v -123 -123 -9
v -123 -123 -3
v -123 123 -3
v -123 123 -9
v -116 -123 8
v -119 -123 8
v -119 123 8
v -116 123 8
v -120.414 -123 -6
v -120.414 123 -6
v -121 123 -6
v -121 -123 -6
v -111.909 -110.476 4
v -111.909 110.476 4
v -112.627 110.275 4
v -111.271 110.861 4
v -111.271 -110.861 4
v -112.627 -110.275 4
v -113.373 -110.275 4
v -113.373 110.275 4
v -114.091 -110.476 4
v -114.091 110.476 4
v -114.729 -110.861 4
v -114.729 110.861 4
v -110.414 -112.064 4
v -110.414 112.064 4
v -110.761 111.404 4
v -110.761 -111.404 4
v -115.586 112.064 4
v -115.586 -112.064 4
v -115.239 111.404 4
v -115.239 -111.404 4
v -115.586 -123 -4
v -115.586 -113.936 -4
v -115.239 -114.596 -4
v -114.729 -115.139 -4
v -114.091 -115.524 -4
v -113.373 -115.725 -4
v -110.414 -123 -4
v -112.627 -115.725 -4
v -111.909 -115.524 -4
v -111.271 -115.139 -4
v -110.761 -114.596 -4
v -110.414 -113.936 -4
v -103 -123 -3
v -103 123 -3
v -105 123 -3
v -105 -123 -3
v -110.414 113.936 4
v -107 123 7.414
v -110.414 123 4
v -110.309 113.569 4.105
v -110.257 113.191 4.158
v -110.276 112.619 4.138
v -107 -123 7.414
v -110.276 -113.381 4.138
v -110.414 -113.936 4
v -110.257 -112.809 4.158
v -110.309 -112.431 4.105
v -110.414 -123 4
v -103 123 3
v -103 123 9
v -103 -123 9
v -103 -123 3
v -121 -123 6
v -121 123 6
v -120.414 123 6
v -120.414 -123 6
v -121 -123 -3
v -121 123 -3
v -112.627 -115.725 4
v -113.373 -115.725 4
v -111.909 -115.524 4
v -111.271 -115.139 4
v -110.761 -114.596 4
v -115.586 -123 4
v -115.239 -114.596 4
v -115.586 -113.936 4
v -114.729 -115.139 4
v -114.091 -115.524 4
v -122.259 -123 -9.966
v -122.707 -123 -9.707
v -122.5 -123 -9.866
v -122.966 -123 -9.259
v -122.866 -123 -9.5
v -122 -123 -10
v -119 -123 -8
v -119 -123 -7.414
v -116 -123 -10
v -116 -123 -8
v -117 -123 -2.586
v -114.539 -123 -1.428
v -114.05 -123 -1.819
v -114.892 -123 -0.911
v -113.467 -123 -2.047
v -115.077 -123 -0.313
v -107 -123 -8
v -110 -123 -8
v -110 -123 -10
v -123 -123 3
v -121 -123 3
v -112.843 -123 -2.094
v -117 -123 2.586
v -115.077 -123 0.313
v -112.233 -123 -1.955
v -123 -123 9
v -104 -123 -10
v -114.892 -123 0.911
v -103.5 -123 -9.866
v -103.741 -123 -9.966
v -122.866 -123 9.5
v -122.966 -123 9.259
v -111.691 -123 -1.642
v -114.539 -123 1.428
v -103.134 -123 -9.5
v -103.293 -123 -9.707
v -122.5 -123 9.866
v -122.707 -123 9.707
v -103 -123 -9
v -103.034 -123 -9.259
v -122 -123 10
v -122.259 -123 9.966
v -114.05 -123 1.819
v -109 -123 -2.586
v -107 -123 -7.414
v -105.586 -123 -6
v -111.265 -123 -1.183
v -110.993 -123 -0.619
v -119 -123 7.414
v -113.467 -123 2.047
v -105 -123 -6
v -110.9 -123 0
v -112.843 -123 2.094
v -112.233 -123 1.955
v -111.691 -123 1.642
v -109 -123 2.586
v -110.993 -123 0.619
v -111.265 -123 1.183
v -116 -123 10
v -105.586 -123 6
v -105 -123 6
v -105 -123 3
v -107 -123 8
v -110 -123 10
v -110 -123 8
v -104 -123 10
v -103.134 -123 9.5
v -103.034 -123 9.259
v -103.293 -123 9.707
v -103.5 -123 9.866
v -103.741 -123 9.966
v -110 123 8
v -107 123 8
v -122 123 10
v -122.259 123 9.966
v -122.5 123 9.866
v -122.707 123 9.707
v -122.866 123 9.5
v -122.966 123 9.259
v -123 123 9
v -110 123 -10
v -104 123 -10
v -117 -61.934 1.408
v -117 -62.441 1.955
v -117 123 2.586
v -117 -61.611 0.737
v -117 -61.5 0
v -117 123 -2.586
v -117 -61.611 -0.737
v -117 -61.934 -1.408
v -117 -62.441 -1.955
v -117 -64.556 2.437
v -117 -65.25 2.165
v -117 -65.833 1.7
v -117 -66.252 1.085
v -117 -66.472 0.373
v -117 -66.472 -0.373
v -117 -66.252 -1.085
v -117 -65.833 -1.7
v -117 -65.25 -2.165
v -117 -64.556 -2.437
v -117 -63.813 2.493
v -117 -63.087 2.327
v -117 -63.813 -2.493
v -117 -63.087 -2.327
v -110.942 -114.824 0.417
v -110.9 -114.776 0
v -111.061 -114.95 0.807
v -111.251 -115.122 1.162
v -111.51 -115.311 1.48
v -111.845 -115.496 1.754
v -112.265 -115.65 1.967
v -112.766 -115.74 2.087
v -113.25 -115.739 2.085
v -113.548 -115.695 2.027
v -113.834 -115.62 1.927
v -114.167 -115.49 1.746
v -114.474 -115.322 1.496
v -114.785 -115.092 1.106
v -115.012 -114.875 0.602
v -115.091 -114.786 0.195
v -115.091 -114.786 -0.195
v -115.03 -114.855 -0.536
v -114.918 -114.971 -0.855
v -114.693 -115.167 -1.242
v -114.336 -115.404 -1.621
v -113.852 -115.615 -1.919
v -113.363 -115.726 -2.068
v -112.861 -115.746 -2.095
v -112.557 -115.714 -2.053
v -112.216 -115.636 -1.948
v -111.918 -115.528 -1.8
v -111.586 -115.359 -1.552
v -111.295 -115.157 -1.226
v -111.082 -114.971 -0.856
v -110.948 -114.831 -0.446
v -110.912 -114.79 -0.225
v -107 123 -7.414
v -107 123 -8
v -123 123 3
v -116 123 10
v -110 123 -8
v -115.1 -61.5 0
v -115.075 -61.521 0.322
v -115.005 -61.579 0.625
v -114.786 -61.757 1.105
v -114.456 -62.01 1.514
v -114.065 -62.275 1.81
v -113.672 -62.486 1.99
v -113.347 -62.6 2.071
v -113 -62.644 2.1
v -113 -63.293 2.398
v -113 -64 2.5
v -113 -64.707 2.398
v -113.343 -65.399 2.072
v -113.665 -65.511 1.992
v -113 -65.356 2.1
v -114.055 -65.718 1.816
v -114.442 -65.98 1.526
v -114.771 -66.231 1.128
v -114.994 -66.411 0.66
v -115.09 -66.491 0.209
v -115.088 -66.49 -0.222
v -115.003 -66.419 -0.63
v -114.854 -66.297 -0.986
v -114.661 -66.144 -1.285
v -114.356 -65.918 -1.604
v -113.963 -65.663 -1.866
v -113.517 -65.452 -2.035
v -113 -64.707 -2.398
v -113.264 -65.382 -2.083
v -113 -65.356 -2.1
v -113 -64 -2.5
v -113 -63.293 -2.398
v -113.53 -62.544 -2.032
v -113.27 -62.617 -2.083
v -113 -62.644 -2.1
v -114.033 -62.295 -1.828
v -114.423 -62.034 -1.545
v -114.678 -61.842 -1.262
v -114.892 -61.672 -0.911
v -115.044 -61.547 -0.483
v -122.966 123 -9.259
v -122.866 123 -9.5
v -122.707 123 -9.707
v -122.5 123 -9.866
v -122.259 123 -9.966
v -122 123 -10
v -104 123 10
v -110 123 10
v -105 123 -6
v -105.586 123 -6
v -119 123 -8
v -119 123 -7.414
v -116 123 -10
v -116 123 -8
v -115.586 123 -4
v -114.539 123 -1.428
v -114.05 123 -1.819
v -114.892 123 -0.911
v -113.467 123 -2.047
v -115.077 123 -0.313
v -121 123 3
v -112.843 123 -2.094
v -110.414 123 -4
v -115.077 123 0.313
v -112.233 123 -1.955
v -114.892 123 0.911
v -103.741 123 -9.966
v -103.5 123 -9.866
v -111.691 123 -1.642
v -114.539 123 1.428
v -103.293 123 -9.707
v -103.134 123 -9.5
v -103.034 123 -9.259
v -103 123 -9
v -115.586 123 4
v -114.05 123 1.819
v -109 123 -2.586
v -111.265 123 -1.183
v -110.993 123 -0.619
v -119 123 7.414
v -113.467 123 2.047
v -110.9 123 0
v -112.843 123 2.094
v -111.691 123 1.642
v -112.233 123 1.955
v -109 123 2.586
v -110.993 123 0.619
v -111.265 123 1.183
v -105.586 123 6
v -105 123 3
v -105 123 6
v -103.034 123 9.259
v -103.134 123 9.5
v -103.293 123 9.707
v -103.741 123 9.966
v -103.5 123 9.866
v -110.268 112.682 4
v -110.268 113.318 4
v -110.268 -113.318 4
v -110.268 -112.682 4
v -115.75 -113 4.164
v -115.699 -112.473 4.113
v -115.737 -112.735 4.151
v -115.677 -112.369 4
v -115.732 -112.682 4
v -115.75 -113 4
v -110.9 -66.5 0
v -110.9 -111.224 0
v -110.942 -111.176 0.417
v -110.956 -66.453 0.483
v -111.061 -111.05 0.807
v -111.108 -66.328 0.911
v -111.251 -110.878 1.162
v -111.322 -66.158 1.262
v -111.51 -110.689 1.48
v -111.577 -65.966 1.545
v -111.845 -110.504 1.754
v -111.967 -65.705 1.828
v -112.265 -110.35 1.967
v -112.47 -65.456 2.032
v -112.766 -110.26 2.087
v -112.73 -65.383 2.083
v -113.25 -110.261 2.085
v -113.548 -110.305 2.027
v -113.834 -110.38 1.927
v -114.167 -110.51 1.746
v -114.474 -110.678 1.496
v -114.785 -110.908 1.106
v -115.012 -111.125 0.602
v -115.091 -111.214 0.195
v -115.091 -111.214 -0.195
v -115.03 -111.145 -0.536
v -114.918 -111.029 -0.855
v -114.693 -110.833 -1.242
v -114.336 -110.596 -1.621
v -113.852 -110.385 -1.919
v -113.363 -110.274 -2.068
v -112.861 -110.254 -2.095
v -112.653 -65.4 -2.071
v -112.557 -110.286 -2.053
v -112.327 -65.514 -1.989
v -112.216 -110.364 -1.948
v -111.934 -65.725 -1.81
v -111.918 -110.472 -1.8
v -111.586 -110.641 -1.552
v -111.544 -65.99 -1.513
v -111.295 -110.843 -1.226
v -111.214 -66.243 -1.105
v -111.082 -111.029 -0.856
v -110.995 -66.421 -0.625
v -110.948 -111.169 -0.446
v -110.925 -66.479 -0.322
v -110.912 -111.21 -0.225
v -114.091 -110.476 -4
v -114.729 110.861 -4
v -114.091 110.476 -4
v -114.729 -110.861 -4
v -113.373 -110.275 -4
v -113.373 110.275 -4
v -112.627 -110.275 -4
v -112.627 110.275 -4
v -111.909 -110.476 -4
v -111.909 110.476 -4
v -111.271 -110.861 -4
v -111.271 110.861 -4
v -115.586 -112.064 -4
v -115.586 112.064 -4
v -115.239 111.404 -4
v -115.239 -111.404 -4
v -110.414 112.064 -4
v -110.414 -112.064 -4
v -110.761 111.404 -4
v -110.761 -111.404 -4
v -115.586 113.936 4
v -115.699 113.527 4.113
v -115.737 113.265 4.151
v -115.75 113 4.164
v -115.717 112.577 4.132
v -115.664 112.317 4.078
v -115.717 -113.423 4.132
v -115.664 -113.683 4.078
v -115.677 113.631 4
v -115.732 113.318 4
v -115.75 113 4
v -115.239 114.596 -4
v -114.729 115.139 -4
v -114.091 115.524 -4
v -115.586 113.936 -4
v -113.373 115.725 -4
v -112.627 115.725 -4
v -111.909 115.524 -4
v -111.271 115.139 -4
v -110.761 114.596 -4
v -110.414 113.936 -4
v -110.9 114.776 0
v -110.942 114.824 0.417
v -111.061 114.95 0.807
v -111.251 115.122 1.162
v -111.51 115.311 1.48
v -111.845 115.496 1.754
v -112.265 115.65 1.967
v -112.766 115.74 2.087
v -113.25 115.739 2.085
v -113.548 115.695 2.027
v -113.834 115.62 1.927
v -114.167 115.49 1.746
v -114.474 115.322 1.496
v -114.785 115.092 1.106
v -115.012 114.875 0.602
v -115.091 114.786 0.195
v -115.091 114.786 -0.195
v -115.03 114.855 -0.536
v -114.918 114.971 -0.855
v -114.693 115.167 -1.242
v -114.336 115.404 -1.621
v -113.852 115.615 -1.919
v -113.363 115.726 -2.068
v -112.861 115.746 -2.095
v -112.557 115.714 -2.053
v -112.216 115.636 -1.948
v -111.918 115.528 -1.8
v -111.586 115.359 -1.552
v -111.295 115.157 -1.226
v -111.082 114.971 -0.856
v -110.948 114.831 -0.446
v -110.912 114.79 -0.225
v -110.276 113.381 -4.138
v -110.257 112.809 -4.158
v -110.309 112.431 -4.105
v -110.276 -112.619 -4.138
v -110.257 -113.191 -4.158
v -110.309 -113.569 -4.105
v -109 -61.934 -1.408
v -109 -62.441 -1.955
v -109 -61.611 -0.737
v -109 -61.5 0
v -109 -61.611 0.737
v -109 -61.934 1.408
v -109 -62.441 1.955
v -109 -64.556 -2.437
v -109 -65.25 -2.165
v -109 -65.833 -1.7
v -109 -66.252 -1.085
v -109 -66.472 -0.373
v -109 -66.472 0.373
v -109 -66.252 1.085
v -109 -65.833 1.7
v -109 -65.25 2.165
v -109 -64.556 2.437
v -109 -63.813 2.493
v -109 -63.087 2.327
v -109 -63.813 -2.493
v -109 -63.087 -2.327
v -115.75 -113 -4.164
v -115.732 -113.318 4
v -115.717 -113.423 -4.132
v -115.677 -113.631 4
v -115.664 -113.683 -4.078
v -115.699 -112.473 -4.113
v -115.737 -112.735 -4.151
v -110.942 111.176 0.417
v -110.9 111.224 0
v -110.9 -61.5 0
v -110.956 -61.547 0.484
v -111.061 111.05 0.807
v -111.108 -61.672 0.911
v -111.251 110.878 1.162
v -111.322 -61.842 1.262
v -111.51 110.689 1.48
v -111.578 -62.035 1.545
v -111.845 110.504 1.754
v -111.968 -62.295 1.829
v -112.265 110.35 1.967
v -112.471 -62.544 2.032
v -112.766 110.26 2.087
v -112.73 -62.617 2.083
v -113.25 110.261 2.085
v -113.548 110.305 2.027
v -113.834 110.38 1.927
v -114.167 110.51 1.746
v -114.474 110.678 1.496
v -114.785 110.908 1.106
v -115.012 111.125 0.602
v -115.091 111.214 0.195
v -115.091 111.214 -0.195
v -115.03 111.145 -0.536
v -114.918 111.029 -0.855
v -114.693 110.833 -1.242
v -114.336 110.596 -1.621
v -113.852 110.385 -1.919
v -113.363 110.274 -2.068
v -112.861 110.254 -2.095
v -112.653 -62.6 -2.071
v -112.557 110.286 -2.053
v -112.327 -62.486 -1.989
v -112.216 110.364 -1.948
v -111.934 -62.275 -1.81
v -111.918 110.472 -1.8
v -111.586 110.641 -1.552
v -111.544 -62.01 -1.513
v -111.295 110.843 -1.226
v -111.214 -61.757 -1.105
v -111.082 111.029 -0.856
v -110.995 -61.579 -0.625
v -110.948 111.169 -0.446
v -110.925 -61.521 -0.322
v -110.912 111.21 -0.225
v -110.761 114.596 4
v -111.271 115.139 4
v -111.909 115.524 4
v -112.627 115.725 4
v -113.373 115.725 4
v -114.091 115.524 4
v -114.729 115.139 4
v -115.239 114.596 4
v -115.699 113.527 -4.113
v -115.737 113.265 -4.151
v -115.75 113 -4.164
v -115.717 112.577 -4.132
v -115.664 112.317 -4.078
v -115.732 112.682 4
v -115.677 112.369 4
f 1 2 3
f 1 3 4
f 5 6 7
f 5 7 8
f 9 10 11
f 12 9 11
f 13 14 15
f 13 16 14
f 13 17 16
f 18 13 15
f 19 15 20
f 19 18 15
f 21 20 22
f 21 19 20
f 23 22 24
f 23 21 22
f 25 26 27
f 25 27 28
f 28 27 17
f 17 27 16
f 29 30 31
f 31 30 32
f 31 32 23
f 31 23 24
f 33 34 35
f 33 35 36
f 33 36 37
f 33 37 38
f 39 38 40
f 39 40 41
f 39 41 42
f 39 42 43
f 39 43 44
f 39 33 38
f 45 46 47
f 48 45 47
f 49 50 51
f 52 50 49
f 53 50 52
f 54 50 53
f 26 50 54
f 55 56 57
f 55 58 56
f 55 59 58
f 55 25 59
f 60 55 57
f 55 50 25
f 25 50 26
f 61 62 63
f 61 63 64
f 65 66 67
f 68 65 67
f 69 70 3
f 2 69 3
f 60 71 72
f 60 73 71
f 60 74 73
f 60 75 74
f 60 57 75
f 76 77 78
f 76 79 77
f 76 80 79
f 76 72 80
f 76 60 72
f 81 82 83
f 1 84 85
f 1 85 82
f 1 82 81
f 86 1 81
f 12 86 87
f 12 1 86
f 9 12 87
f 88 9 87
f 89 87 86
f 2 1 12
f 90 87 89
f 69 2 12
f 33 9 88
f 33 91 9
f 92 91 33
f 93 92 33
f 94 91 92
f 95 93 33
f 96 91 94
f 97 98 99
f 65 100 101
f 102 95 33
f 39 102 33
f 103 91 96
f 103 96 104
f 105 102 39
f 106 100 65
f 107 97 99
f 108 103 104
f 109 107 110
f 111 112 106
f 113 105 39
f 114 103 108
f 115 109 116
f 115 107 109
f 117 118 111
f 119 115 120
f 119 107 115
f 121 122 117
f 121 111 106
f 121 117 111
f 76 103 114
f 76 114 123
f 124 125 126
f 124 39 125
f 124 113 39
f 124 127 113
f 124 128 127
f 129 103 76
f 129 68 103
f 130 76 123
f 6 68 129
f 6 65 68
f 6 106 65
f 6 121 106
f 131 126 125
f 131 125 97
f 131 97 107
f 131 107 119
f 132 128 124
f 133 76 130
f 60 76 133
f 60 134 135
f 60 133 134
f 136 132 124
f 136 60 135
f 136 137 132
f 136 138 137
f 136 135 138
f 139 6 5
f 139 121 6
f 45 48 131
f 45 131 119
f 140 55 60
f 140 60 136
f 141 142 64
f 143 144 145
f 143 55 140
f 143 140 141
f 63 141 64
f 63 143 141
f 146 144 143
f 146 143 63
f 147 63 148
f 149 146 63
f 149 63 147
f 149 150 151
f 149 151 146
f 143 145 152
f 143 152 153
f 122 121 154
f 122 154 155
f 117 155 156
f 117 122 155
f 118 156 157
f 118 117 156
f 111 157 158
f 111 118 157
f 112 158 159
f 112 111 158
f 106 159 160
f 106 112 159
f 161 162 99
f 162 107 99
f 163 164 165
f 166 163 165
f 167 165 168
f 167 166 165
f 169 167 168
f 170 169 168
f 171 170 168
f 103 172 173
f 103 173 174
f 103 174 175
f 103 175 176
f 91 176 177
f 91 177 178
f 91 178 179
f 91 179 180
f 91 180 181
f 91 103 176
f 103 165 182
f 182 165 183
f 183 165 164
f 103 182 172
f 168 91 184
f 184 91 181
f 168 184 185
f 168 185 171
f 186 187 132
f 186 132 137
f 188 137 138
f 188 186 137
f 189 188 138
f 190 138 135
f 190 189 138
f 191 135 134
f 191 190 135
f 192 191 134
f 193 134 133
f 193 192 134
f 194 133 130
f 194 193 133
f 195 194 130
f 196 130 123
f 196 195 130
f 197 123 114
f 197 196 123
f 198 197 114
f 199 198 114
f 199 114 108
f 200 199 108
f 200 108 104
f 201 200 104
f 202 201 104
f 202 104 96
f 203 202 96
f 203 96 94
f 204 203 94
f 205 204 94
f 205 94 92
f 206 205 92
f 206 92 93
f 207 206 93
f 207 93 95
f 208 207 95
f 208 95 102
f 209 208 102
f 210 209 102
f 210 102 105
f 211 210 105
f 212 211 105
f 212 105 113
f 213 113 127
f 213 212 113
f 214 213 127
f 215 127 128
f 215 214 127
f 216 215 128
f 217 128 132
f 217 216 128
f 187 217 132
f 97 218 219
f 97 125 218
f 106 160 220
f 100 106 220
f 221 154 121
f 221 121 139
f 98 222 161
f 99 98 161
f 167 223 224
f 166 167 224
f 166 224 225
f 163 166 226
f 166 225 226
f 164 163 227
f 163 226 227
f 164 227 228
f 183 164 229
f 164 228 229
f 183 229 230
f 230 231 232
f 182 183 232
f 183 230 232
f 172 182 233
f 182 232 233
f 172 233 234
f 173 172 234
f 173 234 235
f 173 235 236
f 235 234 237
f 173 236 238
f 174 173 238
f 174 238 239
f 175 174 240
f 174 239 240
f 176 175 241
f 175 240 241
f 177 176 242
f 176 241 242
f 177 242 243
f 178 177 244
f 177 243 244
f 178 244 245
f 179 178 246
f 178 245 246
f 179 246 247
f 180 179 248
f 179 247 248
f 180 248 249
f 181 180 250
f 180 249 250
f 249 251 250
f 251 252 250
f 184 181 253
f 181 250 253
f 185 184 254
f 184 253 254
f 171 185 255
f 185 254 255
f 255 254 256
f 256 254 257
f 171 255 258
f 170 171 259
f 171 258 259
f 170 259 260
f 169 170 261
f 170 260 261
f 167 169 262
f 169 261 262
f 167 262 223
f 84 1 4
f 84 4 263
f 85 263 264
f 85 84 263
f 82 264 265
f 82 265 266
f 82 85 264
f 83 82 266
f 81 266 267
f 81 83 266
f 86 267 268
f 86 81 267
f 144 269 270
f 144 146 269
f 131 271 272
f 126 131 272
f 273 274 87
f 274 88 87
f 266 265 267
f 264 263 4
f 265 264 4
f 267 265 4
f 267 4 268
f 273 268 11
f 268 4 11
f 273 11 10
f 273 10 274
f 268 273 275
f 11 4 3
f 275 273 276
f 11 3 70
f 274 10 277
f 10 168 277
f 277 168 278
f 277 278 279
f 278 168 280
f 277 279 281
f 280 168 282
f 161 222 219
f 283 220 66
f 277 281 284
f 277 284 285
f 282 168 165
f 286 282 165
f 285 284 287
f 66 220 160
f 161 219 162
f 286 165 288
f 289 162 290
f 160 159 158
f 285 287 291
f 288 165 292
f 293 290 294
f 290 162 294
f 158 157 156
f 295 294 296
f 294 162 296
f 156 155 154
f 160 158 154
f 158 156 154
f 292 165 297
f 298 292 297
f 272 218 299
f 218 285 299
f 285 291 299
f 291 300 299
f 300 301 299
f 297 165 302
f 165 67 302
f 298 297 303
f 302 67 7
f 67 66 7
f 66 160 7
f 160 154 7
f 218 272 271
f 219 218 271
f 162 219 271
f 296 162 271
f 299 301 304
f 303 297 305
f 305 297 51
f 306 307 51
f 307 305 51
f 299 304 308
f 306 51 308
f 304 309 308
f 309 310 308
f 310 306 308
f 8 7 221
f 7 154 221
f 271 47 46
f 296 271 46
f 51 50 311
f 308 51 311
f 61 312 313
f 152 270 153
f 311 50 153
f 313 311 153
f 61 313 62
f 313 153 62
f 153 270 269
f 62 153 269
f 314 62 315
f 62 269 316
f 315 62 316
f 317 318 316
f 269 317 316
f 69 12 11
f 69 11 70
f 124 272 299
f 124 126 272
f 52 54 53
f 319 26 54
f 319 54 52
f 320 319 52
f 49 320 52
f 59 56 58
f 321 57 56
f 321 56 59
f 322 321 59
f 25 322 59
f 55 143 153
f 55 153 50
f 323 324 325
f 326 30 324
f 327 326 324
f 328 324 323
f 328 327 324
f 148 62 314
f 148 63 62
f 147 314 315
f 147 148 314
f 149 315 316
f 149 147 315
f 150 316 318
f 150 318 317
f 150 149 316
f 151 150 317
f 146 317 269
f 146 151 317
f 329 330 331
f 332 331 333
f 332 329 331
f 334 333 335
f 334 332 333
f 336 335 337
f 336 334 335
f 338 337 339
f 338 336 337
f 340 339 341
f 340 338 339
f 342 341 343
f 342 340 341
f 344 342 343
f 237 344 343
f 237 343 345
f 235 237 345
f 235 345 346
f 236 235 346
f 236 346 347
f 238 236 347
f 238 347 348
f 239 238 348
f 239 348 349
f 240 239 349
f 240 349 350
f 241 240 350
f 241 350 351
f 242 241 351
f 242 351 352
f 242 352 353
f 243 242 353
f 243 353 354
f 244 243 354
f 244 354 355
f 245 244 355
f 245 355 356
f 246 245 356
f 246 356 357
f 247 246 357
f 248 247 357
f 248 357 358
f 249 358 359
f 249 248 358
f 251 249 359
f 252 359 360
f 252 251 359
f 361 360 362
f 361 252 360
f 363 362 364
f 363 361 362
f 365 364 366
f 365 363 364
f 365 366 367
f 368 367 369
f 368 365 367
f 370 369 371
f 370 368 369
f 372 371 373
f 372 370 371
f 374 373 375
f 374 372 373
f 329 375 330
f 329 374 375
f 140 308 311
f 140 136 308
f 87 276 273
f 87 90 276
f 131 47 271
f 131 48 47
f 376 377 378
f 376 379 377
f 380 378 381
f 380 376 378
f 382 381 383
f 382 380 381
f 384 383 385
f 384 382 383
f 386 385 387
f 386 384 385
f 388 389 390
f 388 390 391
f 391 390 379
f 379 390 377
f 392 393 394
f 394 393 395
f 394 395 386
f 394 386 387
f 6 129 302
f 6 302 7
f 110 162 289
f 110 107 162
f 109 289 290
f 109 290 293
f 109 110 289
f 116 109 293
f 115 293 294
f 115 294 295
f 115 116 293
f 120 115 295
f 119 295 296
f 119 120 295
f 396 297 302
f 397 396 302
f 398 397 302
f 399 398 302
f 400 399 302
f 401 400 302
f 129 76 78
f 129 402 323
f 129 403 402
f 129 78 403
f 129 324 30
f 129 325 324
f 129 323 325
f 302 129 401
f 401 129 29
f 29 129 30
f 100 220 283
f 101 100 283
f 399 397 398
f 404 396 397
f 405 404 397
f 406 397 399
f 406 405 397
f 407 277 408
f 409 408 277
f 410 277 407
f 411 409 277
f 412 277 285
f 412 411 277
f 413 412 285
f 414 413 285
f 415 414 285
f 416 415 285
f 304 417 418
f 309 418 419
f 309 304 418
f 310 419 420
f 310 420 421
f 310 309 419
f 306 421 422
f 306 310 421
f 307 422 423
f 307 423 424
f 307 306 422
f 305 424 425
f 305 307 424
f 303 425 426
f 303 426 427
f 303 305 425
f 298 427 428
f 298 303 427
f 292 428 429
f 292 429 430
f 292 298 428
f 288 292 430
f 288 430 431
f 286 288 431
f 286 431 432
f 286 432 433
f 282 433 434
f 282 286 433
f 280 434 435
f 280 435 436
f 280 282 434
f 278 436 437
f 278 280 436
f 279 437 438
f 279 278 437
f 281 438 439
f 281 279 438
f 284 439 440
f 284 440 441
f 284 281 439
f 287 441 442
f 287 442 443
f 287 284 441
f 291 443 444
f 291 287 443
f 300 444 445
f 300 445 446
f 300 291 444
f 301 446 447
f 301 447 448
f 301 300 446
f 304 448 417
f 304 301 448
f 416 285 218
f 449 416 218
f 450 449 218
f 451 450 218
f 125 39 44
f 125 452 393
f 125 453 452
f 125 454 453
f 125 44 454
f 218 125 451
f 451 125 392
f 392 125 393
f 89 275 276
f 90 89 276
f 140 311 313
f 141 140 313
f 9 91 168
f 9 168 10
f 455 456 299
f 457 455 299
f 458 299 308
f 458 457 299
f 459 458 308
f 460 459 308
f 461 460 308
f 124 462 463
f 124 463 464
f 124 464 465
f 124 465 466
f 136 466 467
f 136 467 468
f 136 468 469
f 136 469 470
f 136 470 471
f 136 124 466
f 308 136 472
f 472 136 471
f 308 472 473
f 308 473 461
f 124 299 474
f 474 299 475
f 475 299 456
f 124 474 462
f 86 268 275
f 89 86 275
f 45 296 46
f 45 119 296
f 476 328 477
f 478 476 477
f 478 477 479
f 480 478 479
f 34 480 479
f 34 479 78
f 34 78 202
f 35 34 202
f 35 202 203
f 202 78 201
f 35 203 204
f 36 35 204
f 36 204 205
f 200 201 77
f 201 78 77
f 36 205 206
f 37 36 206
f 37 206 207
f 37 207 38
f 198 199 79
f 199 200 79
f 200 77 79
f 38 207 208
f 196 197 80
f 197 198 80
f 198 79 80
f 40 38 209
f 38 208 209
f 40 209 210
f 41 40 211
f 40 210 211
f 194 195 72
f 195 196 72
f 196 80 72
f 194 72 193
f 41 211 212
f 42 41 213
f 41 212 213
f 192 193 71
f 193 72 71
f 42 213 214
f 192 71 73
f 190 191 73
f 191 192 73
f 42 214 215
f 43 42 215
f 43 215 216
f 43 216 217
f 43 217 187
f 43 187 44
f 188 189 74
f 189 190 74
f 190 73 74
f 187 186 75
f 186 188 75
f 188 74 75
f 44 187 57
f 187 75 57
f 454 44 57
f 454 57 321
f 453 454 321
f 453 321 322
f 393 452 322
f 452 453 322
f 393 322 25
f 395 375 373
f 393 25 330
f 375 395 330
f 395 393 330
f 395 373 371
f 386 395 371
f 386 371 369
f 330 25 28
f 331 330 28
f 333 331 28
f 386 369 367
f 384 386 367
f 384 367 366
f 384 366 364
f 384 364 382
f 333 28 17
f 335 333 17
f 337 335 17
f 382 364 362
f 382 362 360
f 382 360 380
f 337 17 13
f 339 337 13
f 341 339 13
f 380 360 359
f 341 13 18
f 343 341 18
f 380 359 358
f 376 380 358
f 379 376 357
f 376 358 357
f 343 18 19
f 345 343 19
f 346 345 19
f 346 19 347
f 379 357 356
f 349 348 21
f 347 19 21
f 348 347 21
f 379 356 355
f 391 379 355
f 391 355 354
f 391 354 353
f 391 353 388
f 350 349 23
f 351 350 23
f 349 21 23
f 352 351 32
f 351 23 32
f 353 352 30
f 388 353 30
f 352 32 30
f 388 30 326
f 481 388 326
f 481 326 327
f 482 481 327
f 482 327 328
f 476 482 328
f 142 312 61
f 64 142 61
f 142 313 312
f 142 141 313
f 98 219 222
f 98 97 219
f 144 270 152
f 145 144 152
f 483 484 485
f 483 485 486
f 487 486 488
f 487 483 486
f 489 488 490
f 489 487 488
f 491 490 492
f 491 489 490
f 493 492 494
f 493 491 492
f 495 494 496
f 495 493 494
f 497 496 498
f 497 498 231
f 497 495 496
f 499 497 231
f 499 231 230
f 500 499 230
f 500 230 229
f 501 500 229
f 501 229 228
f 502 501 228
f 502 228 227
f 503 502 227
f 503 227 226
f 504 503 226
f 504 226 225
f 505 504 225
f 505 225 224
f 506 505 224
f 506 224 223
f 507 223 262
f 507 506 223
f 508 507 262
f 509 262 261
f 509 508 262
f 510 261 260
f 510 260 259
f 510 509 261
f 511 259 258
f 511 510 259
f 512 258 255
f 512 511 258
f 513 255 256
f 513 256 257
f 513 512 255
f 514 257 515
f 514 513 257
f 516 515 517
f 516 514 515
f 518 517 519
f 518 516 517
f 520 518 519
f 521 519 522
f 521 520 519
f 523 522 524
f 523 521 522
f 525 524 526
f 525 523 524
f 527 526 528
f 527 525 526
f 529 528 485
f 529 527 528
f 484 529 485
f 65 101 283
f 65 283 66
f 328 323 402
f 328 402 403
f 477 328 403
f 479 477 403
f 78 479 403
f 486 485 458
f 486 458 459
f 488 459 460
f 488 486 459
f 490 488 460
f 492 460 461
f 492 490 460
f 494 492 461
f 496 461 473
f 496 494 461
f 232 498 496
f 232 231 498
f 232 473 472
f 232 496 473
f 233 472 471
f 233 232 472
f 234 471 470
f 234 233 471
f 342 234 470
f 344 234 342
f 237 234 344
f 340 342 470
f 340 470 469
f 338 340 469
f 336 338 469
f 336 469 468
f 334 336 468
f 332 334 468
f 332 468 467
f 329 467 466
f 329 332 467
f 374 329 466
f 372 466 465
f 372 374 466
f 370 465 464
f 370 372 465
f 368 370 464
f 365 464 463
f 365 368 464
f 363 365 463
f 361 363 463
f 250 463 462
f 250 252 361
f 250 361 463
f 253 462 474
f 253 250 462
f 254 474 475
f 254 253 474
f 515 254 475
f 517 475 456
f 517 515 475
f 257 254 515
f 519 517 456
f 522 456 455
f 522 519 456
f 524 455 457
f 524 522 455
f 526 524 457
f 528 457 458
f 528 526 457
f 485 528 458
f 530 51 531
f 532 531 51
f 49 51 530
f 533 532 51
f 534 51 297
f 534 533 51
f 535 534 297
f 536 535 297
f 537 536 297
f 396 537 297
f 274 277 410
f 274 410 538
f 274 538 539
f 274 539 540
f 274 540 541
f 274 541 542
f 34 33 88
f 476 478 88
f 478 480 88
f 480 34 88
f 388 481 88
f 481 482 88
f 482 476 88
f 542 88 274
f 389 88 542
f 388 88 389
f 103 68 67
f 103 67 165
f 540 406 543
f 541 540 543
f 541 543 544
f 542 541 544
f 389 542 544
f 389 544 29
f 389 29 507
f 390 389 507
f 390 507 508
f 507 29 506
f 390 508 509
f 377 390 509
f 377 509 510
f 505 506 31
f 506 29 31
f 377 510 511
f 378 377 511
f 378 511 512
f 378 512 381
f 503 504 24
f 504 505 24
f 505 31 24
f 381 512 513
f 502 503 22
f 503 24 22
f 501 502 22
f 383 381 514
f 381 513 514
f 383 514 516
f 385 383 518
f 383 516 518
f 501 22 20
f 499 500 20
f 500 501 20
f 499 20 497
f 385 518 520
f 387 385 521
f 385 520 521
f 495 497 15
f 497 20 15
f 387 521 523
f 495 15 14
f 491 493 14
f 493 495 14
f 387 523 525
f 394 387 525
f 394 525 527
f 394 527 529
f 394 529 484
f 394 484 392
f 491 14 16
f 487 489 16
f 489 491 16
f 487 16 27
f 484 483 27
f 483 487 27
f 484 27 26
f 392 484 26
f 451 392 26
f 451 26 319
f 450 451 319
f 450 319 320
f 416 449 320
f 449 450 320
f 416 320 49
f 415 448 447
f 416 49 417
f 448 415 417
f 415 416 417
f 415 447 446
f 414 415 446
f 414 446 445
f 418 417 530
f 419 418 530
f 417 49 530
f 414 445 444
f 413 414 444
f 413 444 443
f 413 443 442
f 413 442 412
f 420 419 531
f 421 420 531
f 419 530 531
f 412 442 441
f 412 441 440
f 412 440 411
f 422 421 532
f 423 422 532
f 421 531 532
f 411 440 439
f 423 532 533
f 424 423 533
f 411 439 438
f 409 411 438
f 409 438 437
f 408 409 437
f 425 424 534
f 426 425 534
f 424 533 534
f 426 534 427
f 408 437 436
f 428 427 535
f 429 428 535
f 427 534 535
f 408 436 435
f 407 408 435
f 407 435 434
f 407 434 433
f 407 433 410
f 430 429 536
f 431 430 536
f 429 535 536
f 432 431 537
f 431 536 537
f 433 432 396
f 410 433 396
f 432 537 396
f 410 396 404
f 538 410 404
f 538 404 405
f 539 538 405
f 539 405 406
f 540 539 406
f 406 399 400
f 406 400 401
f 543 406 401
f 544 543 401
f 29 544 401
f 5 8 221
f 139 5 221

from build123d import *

# Parameters (mm, degrees)
SKETCH044_R          = 2.1
PAD023_DEPTH         = 123
SKETCH054_R          = 2.5
POCKET010_DEPTH      = 10.001
POCKET010_DEPTH_BACK = 10.001
SKETCH094_R          = 2.75
POCKET037_DEPTH      = 14.001
POCKET037_DEPTH_BACK = 6.001


with BuildPart() as part:
    # Sketch044 → Pad023 (new body, symmetric)
    with BuildSketch(Plane.XZ):
        with BuildLine():
            Line((3, 10), (3, 8))
            Line((3, 8), (6, 8))
            Line((6, 8), (6, 7.414214))
            Line((6, 7.414214), (2.585786, 4))
            Line((2.585786, 4), (-2.585786, 4))
            Line((-2.585786, 4), (-6, 7.414214))
            Line((-6, 7.414214), (-6, 8))
            Line((-6, 8), (-3, 8))
            Line((-3, 8), (-3, 10))
            Line((-8.999982, 10), (-3, 10))
            ThreePointArc((-8.999982, 10), (-9.707108, 9.707105), (-10, 8.999978))
            Line((-10, 8.999978), (-10, 3))
            Line((-10, 3), (-8, 3))
            Line((-8, 3), (-8, 6))
            Line((-8, 6), (-7.414214, 6))
            Line((-7.414214, 6), (-4, 2.585786))
            Line((-4, 2.585786), (-4, -2.585786))
            Line((-4, -2.585786), (-7.414214, -6))
            Line((-7.414214, -6), (-8, -6))
            Line((-8, -6), (-8, -3))
            Line((-8, -3), (-10, -3))
            Line((-10, -3), (-10, -9))
            ThreePointArc((-10, -9), (-9.707101, -9.707113), (-8.999982, -10))
            Line((-8.999982, -10), (-3, -10))
            Line((-3, -10), (-3, -8))
            Line((-3, -8), (-6, -8))
            Line((-6, -7.414214), (-6, -8))
            Line((-2.585786, -4), (-6, -7.414214))
            Line((-2.585786, -4), (2.585786, -4))
            Line((2.585786, -4), (6, -7.414214))
            Line((6, -7.414214), (6, -8))
            Line((6, -8), (3, -8))
            Line((3, -8), (3, -10))
            Line((8.999986, -10), (3, -10))
            ThreePointArc((8.999986, -10), (9.707102, -9.707112), (10, -9))
            Line((10, -9), (10, -3))
            Line((10, -3), (8, -3))
            Line((8, -3), (8, -6))
            Line((8, -6), (7.414214, -6))
            Line((7.414214, -6), (4, -2.585786))
            Line((4, -2.585786), (4, 2.585786))
            Line((4, 2.585786), (7.414214, 6))
            Line((7.414214, 6), (8, 6))
            Line((8, 6), (8, 3))
            Line((8, 3), (10, 3))
            Line((10, 8.999978), (10, 3))
            ThreePointArc((10, 8.999978), (9.70711, 9.707104), (8.999986, 10))
            Line((8.999986, 10), (3, 10))
        make_face()
        Circle(SKETCH044_R, mode=Mode.SUBTRACT)
    extrude(amount=PAD023_DEPTH, both=True)

    # Sketch054 → Pocket010 (cut, two sides)
    with BuildSketch(Plane.YZ) as pocket010_sk:
        with Locations((-64, 0)):
            Circle(SKETCH054_R)
    extrude(amount=-POCKET010_DEPTH, mode=Mode.SUBTRACT)
    extrude(pocket010_sk.sketch, amount=POCKET010_DEPTH_BACK, mode=Mode.SUBTRACT)

    # Sketch094 (on Face7 of Pad023) → Pocket037 (cut, two sides)
    with BuildSketch(Plane(origin=(0, 0, 4), x_dir=(-1, 0, 0), z_dir=(0, 0, 1))) as pocket037_sk:
        with Locations((0, 113)):
            Circle(SKETCH094_R)
        with Locations((0, -113)):
            Circle(SKETCH094_R)
    extrude(amount=-POCKET037_DEPTH, mode=Mode.SUBTRACT)
    extrude(pocket037_sk.sketch, amount=POCKET037_DEPTH_BACK, mode=Mode.SUBTRACT)


with BuildPart() as part_1:
    # Body024 placement: moved
    add(part.part.moved(Location((113, 0, 0))))


with BuildPart() as part_2:
    # Clone placement: moved
    add(part_1.part.moved(Location((-113, 0, 0))))


with BuildPart() as part_3:
    # Body026 placement: moved
    add(part_2.part.moved(Location((-113, 0, 0))))


solid = part_3.part
